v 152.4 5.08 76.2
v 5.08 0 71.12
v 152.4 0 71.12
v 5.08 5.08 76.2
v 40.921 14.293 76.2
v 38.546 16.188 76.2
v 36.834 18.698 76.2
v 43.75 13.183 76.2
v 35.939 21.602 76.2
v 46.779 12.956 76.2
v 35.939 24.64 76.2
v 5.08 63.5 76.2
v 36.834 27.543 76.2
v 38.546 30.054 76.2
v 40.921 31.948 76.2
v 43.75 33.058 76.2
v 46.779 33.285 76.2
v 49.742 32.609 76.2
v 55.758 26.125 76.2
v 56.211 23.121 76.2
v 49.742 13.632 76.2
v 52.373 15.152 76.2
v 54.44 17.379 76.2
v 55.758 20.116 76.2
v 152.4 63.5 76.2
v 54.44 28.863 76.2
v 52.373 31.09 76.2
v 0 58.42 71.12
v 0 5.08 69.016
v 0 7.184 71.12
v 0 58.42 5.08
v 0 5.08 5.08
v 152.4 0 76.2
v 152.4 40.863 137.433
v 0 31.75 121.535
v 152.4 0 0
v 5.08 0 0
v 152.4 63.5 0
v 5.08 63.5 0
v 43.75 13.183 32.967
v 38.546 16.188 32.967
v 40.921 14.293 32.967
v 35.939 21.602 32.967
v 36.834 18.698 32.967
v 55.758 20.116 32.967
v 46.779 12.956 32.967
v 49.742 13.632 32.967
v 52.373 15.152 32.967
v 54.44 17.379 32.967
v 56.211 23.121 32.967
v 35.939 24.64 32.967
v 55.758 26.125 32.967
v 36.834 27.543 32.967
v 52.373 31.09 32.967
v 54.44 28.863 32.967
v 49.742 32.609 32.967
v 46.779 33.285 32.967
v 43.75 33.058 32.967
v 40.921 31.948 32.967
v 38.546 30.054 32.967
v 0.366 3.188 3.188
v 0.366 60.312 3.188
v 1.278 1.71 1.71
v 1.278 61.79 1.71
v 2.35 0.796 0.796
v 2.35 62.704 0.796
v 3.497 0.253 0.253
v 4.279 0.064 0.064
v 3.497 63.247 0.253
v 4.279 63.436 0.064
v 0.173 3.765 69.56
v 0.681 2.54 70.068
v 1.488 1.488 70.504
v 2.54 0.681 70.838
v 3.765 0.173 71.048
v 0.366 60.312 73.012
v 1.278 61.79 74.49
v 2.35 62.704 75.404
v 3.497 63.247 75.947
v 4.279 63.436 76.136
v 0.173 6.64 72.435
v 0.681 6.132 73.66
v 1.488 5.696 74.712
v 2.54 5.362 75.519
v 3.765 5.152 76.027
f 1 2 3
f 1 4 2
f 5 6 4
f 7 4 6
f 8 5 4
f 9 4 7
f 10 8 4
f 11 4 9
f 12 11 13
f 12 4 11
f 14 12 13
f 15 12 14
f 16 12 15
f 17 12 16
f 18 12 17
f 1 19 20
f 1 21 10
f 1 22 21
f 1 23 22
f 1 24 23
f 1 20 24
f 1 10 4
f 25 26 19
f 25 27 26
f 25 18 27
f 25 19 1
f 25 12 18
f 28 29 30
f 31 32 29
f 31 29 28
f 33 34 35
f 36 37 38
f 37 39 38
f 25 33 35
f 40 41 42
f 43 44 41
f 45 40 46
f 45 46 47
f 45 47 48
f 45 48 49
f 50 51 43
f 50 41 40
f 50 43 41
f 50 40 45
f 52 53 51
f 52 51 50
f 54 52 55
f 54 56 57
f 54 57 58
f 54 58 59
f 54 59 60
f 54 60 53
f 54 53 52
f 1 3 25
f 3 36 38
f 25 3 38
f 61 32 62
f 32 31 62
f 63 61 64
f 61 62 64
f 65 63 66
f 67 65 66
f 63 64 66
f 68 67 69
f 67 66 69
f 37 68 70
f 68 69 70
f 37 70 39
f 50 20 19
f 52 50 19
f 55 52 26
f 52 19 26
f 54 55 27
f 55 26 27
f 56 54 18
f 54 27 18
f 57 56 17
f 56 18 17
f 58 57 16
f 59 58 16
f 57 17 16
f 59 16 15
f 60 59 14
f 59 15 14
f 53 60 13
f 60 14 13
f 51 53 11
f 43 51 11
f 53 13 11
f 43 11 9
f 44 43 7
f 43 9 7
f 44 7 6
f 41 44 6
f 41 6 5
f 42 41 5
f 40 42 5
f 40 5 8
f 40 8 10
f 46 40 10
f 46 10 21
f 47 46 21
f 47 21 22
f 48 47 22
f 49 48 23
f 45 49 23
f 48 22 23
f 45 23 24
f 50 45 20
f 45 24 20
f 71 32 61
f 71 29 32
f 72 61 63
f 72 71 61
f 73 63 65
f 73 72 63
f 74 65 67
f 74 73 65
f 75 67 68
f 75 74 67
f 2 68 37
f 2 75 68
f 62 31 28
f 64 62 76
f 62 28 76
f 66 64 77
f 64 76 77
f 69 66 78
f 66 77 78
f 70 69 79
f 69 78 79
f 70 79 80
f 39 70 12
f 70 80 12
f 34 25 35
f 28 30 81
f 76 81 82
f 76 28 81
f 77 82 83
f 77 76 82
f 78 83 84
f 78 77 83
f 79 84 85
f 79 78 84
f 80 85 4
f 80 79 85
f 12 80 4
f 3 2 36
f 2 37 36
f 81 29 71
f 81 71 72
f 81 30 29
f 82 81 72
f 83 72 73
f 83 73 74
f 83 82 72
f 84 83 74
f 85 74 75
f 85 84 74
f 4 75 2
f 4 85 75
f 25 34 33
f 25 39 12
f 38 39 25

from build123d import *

# Parameters (mm, degrees)
F0_W     = 152.4
F0_H     = 63.5
F1_DEPTH = 76.2
F4_R     = 10.1930298676
F5_DEPTH = 43.23312
F7_SIZE  = 5.08
F8_R     = 5.08


# Not quite as in the source:
# - a feature of the source that left no trace in its solid (it failed there, or was rolled back) is left out


with BuildPart() as f1:
    # F0 (on Top) → F1 (new body)
    with BuildSketch(Plane.XY):
        with Locations((76.2, 31.75)):
            Rectangle(F0_W, F0_H)
    extrude(amount=F1_DEPTH)

    # F4 (on face) → F5 (cut)
    with BuildSketch(Plane.XY.offset(76.2)):
        with Locations((46.0177734494, 23.120848462)):
            Circle(F4_R)
    extrude(amount=-F5_DEPTH, mode=Mode.SUBTRACT)

    # F7
    f7_edges = [f1.edges().sort_by_distance(p)[0] for p in [
        (76.2, 0, 76.2),
    ]]
    chamfer(f7_edges, length=F7_SIZE)

    # F8
    f8_edges = [f1.edges().sort_by_distance(p)[0] for p in [
        (0, 0, 35.56),
        (0, 2.54, 73.66),
        (0, 31.75, 0),
        (0, 34.29, 76.2),
        (0, 63.5, 38.1),
    ]]
    fillet(f8_edges, radius=F8_R)


with BuildPart() as f6:
    # F2 (on face) → F6 section 0
    with BuildSketch(Plane.YZ.offset(152.4), mode=Mode.PRIVATE) as f6_s0:
        Polygon((40.8631898463, 137.4332010746), (0, 76.2), (63.5, 76.2), align=None)
    loft([f6_s0.sketch, Vertex(0, 31.75, 121.5353310108)])


solid = Compound([f1.part, f6.part])
